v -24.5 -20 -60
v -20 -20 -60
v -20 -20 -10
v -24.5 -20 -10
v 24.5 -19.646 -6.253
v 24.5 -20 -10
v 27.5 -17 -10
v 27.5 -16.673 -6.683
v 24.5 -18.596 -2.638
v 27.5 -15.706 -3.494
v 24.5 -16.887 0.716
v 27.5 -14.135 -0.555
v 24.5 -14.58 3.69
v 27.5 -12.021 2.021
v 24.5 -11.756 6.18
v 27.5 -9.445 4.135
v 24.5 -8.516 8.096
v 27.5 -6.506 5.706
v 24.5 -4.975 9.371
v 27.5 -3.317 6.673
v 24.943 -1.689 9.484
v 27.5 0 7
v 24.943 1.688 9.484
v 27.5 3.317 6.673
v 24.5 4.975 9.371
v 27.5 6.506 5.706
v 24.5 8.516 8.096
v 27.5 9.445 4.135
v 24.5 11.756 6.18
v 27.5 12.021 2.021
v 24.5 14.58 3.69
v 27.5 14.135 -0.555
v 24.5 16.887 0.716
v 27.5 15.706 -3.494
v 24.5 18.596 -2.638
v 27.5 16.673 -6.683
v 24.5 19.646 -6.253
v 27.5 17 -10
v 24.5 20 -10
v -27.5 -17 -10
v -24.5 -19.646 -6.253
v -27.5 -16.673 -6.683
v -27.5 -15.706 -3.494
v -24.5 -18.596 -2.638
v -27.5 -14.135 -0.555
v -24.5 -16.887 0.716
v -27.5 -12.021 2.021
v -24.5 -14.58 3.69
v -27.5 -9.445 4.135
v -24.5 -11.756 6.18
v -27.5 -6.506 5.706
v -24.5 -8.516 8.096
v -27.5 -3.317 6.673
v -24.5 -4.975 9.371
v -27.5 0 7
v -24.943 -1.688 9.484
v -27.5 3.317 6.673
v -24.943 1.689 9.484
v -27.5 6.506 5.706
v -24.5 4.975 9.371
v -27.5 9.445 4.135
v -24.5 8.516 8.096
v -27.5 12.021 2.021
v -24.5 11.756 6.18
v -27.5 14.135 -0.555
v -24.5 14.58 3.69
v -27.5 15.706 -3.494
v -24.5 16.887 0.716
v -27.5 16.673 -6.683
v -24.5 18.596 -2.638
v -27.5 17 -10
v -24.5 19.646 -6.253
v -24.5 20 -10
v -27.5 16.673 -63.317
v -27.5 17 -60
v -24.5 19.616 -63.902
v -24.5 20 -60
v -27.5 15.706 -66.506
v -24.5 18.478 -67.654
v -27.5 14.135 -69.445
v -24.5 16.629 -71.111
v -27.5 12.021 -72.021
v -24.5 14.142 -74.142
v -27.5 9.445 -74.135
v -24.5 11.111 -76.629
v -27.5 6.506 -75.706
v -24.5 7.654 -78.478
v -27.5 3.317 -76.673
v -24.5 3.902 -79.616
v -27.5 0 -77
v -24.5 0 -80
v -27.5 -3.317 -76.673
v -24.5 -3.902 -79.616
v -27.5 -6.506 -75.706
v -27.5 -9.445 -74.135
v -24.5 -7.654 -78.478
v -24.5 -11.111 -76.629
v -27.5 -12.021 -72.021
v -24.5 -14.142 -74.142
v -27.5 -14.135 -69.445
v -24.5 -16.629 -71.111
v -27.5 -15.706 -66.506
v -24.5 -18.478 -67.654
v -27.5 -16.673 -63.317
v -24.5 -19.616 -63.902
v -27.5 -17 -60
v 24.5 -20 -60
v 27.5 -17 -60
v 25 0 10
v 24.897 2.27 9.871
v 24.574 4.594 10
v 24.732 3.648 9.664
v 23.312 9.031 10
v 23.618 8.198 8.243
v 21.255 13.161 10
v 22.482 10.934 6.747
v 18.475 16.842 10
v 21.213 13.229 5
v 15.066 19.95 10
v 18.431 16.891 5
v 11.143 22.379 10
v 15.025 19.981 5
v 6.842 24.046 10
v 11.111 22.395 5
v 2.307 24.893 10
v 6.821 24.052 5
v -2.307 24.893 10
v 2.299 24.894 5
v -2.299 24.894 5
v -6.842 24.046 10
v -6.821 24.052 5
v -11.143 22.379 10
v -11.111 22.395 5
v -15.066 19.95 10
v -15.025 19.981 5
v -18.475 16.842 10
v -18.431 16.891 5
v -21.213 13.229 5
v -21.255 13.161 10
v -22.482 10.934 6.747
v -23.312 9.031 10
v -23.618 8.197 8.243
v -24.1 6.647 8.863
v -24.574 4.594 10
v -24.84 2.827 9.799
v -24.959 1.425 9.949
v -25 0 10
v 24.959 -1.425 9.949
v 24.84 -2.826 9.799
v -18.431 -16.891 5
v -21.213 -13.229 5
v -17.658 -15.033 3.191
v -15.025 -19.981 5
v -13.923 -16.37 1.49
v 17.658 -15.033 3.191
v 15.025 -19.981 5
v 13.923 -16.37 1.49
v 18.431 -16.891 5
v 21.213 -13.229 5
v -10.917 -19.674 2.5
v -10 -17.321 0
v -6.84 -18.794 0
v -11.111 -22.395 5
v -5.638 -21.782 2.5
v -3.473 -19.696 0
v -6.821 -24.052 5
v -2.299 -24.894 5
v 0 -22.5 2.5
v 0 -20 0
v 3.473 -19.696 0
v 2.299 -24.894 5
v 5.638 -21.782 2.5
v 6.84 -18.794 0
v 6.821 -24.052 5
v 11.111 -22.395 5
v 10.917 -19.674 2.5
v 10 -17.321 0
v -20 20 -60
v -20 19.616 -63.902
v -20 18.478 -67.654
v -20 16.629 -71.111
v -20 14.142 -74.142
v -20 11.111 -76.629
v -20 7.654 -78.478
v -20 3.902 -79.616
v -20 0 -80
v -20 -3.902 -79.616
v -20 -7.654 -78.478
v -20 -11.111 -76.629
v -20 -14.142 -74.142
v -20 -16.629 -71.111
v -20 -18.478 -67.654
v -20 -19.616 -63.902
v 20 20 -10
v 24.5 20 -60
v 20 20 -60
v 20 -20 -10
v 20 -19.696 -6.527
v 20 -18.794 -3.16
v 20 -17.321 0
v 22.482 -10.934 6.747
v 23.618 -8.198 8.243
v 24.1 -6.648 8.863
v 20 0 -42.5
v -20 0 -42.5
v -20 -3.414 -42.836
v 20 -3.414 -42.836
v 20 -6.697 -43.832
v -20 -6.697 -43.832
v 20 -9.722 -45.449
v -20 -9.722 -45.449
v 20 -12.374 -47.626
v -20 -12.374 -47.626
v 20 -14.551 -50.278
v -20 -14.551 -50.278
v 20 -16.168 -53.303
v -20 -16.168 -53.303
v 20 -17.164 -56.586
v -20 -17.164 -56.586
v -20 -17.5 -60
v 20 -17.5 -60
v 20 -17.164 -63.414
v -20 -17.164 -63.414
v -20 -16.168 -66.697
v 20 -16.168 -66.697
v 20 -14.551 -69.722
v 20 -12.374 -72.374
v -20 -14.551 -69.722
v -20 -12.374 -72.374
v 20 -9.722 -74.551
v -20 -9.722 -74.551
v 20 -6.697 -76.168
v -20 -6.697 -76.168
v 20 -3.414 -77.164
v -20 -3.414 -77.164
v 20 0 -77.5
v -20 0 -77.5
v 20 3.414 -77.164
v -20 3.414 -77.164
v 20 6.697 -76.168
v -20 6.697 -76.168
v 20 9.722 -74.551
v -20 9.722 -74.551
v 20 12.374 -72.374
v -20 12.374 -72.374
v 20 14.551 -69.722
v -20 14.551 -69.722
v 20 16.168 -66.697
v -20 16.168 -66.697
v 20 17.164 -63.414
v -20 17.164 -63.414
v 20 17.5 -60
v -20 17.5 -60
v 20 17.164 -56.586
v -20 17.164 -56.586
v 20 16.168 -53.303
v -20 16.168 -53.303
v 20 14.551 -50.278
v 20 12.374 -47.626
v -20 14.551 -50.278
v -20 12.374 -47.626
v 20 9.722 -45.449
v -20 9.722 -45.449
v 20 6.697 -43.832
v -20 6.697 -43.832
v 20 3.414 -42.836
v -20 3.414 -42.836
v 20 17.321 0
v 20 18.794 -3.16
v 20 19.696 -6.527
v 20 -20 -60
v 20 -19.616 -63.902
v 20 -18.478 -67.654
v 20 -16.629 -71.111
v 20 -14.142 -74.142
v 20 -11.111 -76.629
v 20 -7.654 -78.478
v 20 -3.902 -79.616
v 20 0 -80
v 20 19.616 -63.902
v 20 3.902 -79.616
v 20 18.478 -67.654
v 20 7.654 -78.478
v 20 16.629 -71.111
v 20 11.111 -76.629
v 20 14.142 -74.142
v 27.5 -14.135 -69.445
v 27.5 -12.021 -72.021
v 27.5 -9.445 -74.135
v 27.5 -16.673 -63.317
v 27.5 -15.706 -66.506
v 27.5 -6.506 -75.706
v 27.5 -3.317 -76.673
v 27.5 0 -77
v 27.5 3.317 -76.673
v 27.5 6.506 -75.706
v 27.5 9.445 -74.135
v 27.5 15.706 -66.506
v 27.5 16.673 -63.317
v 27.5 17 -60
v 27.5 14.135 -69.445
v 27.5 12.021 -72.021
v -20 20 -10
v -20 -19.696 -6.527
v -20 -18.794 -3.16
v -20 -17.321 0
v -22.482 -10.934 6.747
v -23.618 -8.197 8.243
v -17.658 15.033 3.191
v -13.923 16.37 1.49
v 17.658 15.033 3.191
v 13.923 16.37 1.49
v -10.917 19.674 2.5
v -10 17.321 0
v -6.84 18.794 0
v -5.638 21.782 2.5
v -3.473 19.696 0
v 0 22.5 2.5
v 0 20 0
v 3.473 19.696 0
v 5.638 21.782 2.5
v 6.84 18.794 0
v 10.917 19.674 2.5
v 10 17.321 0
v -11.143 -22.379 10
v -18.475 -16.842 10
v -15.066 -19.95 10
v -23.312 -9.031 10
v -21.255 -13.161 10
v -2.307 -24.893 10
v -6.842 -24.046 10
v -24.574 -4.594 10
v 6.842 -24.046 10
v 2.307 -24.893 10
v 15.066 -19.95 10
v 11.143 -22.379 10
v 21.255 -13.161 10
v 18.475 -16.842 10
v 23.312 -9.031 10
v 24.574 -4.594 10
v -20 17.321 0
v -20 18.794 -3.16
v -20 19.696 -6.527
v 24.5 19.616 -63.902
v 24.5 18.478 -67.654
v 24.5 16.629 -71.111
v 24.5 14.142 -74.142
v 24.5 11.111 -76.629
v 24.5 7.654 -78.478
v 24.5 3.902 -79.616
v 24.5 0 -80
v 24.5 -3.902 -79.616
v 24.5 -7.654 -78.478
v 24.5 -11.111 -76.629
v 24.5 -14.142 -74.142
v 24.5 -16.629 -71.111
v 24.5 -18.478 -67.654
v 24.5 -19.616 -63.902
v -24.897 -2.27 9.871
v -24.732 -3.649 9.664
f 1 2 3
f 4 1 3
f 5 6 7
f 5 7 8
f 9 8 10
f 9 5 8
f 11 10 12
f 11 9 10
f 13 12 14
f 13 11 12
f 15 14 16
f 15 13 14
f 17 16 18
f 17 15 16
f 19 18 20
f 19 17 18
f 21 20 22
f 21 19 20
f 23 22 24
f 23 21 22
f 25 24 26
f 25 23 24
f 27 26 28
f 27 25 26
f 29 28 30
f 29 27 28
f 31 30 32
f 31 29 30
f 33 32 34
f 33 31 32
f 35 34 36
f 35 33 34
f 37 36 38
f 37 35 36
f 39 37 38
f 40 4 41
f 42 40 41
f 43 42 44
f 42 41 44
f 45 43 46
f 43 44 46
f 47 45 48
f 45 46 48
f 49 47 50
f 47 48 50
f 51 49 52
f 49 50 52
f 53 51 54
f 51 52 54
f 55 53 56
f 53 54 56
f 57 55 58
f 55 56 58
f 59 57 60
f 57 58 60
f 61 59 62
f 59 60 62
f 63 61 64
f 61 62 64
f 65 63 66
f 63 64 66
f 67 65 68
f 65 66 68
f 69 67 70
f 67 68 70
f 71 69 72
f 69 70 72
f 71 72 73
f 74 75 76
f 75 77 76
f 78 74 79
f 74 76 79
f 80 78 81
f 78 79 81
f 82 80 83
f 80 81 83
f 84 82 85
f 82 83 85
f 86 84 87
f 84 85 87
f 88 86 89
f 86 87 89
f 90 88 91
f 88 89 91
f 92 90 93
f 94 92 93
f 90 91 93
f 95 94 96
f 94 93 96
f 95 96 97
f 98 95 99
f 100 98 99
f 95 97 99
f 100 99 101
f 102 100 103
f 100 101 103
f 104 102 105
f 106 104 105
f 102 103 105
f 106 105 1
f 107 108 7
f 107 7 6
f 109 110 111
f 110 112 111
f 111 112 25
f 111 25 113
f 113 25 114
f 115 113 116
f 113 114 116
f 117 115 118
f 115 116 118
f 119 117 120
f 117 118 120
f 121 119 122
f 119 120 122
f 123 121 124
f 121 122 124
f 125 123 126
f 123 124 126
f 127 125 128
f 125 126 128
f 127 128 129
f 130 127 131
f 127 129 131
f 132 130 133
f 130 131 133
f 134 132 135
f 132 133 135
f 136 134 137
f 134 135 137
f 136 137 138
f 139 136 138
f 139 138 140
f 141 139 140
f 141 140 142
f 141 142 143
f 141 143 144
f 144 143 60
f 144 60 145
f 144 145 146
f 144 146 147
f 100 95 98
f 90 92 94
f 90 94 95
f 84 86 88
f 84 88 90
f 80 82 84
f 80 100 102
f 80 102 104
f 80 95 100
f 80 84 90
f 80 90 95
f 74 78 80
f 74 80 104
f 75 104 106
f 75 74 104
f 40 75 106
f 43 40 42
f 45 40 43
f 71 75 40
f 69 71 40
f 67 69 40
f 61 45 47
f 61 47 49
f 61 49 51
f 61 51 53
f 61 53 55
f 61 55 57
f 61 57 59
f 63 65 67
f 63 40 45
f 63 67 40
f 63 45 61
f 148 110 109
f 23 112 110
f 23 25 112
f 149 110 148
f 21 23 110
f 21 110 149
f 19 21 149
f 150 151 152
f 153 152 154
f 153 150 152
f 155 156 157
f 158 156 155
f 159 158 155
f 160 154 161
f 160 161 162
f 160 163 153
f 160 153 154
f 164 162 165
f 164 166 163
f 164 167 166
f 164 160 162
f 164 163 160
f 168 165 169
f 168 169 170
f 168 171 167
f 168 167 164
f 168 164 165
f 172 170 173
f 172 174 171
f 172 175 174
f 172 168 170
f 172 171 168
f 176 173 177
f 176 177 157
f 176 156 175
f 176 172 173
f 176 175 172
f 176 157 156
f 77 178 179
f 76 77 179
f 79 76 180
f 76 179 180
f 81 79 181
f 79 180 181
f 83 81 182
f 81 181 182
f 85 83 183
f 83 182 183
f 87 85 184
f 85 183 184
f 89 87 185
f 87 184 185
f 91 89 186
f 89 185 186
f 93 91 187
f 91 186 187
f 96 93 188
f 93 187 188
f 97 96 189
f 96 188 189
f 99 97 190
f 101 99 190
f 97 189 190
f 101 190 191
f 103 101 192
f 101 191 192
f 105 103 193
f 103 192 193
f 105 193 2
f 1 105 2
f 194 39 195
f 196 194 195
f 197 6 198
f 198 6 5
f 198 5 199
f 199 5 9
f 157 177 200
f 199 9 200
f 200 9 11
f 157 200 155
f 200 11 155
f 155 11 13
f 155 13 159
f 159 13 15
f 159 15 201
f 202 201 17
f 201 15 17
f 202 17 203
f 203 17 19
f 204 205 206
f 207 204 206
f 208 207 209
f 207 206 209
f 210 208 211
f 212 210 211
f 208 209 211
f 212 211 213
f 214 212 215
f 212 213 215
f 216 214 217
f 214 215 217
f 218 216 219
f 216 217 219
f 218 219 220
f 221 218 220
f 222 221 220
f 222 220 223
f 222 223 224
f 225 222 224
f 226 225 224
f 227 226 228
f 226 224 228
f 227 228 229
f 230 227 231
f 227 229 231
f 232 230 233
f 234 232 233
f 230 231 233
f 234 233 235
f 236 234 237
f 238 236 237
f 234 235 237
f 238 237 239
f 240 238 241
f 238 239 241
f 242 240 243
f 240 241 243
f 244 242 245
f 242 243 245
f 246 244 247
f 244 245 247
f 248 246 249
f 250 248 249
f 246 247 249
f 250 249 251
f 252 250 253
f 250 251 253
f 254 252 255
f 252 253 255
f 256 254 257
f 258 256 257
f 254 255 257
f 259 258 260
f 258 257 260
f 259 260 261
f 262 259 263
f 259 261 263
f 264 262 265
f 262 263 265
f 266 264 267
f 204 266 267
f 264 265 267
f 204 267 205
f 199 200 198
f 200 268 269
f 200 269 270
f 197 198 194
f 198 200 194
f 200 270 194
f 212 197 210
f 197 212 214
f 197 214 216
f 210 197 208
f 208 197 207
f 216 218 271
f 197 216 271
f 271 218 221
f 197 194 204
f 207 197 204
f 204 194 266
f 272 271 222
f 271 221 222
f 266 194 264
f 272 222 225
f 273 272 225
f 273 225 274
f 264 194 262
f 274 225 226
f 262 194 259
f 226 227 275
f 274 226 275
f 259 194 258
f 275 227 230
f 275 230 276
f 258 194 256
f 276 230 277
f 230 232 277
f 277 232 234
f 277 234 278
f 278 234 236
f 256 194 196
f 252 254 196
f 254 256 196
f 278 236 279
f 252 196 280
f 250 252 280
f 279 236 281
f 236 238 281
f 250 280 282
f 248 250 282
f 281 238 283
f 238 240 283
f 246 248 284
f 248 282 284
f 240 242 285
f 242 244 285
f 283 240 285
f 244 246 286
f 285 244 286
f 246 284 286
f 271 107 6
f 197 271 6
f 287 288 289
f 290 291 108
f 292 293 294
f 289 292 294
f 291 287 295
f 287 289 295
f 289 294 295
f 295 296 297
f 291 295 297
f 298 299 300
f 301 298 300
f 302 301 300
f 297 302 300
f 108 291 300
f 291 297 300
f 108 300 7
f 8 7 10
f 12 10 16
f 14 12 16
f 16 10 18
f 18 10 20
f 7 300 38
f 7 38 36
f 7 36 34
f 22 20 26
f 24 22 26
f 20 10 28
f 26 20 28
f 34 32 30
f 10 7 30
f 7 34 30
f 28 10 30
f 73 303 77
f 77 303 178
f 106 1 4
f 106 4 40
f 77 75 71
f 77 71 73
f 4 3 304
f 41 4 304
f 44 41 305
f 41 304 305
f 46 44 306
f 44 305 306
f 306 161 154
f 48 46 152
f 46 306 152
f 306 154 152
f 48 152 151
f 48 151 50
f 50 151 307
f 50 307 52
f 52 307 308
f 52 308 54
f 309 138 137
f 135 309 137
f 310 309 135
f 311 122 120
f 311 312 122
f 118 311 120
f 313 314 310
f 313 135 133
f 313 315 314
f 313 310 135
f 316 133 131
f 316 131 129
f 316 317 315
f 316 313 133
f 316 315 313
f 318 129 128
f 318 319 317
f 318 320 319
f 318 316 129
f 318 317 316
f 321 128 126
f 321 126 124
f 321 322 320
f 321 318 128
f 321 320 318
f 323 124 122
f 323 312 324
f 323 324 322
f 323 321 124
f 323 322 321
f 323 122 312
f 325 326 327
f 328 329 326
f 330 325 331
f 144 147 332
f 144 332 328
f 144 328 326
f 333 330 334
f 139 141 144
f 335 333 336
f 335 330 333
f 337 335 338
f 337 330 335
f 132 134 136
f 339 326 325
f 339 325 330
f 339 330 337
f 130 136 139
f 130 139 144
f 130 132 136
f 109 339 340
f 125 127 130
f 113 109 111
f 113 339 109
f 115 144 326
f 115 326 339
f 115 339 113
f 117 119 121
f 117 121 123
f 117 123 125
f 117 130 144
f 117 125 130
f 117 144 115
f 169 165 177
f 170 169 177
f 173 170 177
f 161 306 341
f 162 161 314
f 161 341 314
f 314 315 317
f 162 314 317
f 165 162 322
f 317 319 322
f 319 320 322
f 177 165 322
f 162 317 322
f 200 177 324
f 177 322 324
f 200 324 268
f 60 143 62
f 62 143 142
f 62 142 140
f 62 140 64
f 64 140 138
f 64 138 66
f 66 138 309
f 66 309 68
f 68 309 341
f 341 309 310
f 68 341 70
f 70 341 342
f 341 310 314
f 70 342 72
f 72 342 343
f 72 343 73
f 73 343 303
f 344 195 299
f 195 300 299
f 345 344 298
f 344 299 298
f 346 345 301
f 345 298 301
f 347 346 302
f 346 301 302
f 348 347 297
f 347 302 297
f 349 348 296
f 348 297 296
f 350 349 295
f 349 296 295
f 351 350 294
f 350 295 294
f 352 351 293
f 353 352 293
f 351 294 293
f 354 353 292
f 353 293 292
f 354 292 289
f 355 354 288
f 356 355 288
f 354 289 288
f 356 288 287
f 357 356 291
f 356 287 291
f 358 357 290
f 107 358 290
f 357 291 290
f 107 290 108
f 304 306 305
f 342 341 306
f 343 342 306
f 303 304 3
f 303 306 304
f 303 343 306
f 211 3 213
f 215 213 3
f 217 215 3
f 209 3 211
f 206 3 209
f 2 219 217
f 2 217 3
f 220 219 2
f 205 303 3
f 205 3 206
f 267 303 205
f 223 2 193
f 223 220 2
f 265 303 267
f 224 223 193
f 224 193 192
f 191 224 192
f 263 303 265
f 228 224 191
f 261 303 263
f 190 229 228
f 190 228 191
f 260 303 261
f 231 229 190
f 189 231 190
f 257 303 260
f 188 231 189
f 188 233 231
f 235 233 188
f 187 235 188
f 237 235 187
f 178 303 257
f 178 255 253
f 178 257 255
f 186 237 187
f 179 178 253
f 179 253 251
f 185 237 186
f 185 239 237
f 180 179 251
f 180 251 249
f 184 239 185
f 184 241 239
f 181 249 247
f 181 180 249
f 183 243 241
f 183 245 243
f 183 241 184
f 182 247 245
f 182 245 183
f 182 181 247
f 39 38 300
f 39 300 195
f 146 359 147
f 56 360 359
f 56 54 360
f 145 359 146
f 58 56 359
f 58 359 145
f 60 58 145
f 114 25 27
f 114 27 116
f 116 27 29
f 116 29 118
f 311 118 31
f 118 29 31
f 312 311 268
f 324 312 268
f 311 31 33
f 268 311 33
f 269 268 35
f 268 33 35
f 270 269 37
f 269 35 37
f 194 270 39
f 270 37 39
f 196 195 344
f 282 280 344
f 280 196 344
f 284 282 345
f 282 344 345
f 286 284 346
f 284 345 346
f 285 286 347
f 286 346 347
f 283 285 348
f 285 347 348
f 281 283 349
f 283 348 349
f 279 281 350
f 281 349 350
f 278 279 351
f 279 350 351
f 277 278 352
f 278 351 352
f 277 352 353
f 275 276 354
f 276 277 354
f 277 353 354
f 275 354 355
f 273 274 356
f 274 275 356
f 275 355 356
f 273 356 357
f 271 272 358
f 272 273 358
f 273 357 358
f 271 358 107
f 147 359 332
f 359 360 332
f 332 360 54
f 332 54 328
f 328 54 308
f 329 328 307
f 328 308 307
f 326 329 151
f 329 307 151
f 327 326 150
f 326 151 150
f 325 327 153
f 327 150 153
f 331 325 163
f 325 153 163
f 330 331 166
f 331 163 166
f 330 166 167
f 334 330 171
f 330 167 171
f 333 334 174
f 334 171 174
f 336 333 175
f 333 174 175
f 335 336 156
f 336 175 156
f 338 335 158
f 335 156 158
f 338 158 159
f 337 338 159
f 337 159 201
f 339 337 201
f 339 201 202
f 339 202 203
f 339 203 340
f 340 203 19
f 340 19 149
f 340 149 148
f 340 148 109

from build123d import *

# Parameters (mm, degrees)
SKETCH1_R           = 25
BOSS_EXTRUDE1_DEPTH = 10
BOSS_EXTRUDE3_DEPTH = 27.5
SKETCH7_W           = 40
SKETCH7_H           = 96.533506044
CUT_EXTRUDE3_DEPTH  = 55
CHAMFER1_SIZE       = 3
SKETCH8_R           = 17.5
BOSS_EXTRUDE4_DEPTH = 40
CHAMFER2_SIZE       = 5


with BuildPart() as part:
    # Sketch1 → Boss-Extrude1 (new body)
    with BuildSketch(Plane.XY):
        Circle(SKETCH1_R)
    extrude(amount=BOSS_EXTRUDE1_DEPTH)

    # Sketch6 → Boss-Extrude3 (add, symmetric)
    with BuildSketch(Plane(origin=(0, 0, 0), x_dir=(0, 0, -1), z_dir=(1, 0, 0))):
        with BuildLine():
            Line((10, 20), (60, 20))
            ThreePointArc((60, 20), (80, 0), (60, -20))
            Line((60, -20), (10, -20))
            ThreePointArc((10, -20), (-10, 0), (10, 20))
        make_face()
    extrude(amount=BOSS_EXTRUDE3_DEPTH, both=True)

    # Sketch7 → Cut-Extrude3 (cut)
    with BuildSketch(Plane(origin=(0, 20, 0), x_dir=(1, 0, 0), z_dir=(0, 1, 0))):
        with Locations((0, 48.266753022)):
            Rectangle(SKETCH7_W, SKETCH7_H)
    extrude(amount=-CUT_EXTRUDE3_DEPTH, mode=Mode.SUBTRACT)

    # Chamfer1
    # the kernel refuses this chamfer: 3 mm, written as the material it takes off along each edge
    with BuildSketch(Plane(origin=(-27.5, -20, -60), x_dir=(0.9996219169112965, -0.02749587661058676, 0), z_dir=(0, 0, 1)), Plane(origin=(27.5, -20, -60), x_dir=(0.027495876610586768, 0.9996219169112968, 0), z_dir=(0, 0, 1)), Plane(origin=(27.5, 20, -10), x_dir=(0.027495876610586768, -0.9996219169112968, 0), z_dir=(0, 0, -1))) as chamfer1_piece_1:
        Polygon((CHAMFER1_SIZE * 0.999621916911, CHAMFER1_SIZE * 0.0274958766106), (-CHAMFER1_SIZE * 0.0274958766106, CHAMFER1_SIZE * 0.999621916911), (0, 0), align=None)
    extrude(amount=50, mode=Mode.SUBTRACT)
    with BuildSketch(Plane(origin=(-27.5, 0, -60), x_dir=(0, 1, 0), z_dir=(0, 0, 1))) as chamfer1_piece_2:
        Polygon((20 - CHAMFER1_SIZE, 0), (20, -CHAMFER1_SIZE), (20, 0), align=None)
    revolve(axis=Axis((-27.5, 0, -60), (-1, 0, 0)), revolution_arc=180, mode=Mode.SUBTRACT)
    with BuildSketch(Plane(origin=(-27.5, 0, -10), x_dir=(0, -1, 0), z_dir=(0, 0, -1))) as chamfer1_piece_3_section:
        Polygon((20 - CHAMFER1_SIZE, 0), (20, -CHAMFER1_SIZE), (20, 0), align=None)
    chamfer1_piece_3 = revolve(axis=Axis((-27.5, 0, -10), (-1, 0, 0)), revolution_arc=180, mode=Mode.PRIVATE)
    chamfer1_piece_3 = chamfer1_piece_3 - Plane(origin=(0, 0, 8.545585815), x_dir=(1, 0, 0), z_dir=(0, 0, -1)) * Cylinder(25, 81, mode=Mode.PRIVATE)
    add(chamfer1_piece_3, mode=Mode.SUBTRACT)
    with BuildSketch(Plane(origin=(-27.5, 20, -10), x_dir=(-0.027495876610586768, -0.9996219169112968, 0), z_dir=(0, 0, -1))) as chamfer1_piece_4:
        Polygon((CHAMFER1_SIZE * 0.999621916911, -CHAMFER1_SIZE * 0.0274958766106), (-CHAMFER1_SIZE * 0.0274958766106, -CHAMFER1_SIZE * 0.999621916911), (0, 0), align=None)
    extrude(amount=50, mode=Mode.SUBTRACT)
    with BuildSketch(Plane(origin=(27.5, 0, -60), x_dir=(0, 1, 0), z_dir=(0, 0, 1))) as chamfer1_piece_5:
        Polygon((20, CHAMFER1_SIZE), (20 - CHAMFER1_SIZE, 0), (20, 0), align=None)
    revolve(axis=Axis((27.5, 0, -60), (-1, 0, 0)), revolution_arc=180, mode=Mode.SUBTRACT)
    with BuildSketch(Plane(origin=(27.5, 0, -10), x_dir=(0, -1, 0), z_dir=(0, 0, -1))) as chamfer1_piece_6_section:
        Polygon((20 - CHAMFER1_SIZE, 0), (20, CHAMFER1_SIZE), (20, 0), align=None)
    chamfer1_piece_6 = revolve(axis=Axis((27.5, 0, -10), (-1, 0, 0)), revolution_arc=180, mode=Mode.PRIVATE)
    chamfer1_piece_6 = chamfer1_piece_6 - Plane(origin=(0, 0, 8.545585813), x_dir=(1, 0, 0), z_dir=(0, 0, -1)) * Cylinder(25, 81, mode=Mode.PRIVATE)
    add(chamfer1_piece_6, mode=Mode.SUBTRACT)

    # Sketch8 → Boss-Extrude4 (add)
    with BuildSketch(Plane(origin=(-20, 0, 0), x_dir=(0, 0, -1), z_dir=(1, 0, 0))):
        with Locations(Location((60, 0, 0), (0, 0, 180))):
            Circle(SKETCH8_R)
    extrude(amount=BOSS_EXTRUDE4_DEPTH)

    # Chamfer2
    chamfer2_edges = [part.edges().sort_by_distance(p)[0] for p in [
        (0, 25, 0),
        (0, -25, 0),
    ]]
    chamfer(chamfer2_edges, length=CHAMFER2_SIZE)


solid = part.part
